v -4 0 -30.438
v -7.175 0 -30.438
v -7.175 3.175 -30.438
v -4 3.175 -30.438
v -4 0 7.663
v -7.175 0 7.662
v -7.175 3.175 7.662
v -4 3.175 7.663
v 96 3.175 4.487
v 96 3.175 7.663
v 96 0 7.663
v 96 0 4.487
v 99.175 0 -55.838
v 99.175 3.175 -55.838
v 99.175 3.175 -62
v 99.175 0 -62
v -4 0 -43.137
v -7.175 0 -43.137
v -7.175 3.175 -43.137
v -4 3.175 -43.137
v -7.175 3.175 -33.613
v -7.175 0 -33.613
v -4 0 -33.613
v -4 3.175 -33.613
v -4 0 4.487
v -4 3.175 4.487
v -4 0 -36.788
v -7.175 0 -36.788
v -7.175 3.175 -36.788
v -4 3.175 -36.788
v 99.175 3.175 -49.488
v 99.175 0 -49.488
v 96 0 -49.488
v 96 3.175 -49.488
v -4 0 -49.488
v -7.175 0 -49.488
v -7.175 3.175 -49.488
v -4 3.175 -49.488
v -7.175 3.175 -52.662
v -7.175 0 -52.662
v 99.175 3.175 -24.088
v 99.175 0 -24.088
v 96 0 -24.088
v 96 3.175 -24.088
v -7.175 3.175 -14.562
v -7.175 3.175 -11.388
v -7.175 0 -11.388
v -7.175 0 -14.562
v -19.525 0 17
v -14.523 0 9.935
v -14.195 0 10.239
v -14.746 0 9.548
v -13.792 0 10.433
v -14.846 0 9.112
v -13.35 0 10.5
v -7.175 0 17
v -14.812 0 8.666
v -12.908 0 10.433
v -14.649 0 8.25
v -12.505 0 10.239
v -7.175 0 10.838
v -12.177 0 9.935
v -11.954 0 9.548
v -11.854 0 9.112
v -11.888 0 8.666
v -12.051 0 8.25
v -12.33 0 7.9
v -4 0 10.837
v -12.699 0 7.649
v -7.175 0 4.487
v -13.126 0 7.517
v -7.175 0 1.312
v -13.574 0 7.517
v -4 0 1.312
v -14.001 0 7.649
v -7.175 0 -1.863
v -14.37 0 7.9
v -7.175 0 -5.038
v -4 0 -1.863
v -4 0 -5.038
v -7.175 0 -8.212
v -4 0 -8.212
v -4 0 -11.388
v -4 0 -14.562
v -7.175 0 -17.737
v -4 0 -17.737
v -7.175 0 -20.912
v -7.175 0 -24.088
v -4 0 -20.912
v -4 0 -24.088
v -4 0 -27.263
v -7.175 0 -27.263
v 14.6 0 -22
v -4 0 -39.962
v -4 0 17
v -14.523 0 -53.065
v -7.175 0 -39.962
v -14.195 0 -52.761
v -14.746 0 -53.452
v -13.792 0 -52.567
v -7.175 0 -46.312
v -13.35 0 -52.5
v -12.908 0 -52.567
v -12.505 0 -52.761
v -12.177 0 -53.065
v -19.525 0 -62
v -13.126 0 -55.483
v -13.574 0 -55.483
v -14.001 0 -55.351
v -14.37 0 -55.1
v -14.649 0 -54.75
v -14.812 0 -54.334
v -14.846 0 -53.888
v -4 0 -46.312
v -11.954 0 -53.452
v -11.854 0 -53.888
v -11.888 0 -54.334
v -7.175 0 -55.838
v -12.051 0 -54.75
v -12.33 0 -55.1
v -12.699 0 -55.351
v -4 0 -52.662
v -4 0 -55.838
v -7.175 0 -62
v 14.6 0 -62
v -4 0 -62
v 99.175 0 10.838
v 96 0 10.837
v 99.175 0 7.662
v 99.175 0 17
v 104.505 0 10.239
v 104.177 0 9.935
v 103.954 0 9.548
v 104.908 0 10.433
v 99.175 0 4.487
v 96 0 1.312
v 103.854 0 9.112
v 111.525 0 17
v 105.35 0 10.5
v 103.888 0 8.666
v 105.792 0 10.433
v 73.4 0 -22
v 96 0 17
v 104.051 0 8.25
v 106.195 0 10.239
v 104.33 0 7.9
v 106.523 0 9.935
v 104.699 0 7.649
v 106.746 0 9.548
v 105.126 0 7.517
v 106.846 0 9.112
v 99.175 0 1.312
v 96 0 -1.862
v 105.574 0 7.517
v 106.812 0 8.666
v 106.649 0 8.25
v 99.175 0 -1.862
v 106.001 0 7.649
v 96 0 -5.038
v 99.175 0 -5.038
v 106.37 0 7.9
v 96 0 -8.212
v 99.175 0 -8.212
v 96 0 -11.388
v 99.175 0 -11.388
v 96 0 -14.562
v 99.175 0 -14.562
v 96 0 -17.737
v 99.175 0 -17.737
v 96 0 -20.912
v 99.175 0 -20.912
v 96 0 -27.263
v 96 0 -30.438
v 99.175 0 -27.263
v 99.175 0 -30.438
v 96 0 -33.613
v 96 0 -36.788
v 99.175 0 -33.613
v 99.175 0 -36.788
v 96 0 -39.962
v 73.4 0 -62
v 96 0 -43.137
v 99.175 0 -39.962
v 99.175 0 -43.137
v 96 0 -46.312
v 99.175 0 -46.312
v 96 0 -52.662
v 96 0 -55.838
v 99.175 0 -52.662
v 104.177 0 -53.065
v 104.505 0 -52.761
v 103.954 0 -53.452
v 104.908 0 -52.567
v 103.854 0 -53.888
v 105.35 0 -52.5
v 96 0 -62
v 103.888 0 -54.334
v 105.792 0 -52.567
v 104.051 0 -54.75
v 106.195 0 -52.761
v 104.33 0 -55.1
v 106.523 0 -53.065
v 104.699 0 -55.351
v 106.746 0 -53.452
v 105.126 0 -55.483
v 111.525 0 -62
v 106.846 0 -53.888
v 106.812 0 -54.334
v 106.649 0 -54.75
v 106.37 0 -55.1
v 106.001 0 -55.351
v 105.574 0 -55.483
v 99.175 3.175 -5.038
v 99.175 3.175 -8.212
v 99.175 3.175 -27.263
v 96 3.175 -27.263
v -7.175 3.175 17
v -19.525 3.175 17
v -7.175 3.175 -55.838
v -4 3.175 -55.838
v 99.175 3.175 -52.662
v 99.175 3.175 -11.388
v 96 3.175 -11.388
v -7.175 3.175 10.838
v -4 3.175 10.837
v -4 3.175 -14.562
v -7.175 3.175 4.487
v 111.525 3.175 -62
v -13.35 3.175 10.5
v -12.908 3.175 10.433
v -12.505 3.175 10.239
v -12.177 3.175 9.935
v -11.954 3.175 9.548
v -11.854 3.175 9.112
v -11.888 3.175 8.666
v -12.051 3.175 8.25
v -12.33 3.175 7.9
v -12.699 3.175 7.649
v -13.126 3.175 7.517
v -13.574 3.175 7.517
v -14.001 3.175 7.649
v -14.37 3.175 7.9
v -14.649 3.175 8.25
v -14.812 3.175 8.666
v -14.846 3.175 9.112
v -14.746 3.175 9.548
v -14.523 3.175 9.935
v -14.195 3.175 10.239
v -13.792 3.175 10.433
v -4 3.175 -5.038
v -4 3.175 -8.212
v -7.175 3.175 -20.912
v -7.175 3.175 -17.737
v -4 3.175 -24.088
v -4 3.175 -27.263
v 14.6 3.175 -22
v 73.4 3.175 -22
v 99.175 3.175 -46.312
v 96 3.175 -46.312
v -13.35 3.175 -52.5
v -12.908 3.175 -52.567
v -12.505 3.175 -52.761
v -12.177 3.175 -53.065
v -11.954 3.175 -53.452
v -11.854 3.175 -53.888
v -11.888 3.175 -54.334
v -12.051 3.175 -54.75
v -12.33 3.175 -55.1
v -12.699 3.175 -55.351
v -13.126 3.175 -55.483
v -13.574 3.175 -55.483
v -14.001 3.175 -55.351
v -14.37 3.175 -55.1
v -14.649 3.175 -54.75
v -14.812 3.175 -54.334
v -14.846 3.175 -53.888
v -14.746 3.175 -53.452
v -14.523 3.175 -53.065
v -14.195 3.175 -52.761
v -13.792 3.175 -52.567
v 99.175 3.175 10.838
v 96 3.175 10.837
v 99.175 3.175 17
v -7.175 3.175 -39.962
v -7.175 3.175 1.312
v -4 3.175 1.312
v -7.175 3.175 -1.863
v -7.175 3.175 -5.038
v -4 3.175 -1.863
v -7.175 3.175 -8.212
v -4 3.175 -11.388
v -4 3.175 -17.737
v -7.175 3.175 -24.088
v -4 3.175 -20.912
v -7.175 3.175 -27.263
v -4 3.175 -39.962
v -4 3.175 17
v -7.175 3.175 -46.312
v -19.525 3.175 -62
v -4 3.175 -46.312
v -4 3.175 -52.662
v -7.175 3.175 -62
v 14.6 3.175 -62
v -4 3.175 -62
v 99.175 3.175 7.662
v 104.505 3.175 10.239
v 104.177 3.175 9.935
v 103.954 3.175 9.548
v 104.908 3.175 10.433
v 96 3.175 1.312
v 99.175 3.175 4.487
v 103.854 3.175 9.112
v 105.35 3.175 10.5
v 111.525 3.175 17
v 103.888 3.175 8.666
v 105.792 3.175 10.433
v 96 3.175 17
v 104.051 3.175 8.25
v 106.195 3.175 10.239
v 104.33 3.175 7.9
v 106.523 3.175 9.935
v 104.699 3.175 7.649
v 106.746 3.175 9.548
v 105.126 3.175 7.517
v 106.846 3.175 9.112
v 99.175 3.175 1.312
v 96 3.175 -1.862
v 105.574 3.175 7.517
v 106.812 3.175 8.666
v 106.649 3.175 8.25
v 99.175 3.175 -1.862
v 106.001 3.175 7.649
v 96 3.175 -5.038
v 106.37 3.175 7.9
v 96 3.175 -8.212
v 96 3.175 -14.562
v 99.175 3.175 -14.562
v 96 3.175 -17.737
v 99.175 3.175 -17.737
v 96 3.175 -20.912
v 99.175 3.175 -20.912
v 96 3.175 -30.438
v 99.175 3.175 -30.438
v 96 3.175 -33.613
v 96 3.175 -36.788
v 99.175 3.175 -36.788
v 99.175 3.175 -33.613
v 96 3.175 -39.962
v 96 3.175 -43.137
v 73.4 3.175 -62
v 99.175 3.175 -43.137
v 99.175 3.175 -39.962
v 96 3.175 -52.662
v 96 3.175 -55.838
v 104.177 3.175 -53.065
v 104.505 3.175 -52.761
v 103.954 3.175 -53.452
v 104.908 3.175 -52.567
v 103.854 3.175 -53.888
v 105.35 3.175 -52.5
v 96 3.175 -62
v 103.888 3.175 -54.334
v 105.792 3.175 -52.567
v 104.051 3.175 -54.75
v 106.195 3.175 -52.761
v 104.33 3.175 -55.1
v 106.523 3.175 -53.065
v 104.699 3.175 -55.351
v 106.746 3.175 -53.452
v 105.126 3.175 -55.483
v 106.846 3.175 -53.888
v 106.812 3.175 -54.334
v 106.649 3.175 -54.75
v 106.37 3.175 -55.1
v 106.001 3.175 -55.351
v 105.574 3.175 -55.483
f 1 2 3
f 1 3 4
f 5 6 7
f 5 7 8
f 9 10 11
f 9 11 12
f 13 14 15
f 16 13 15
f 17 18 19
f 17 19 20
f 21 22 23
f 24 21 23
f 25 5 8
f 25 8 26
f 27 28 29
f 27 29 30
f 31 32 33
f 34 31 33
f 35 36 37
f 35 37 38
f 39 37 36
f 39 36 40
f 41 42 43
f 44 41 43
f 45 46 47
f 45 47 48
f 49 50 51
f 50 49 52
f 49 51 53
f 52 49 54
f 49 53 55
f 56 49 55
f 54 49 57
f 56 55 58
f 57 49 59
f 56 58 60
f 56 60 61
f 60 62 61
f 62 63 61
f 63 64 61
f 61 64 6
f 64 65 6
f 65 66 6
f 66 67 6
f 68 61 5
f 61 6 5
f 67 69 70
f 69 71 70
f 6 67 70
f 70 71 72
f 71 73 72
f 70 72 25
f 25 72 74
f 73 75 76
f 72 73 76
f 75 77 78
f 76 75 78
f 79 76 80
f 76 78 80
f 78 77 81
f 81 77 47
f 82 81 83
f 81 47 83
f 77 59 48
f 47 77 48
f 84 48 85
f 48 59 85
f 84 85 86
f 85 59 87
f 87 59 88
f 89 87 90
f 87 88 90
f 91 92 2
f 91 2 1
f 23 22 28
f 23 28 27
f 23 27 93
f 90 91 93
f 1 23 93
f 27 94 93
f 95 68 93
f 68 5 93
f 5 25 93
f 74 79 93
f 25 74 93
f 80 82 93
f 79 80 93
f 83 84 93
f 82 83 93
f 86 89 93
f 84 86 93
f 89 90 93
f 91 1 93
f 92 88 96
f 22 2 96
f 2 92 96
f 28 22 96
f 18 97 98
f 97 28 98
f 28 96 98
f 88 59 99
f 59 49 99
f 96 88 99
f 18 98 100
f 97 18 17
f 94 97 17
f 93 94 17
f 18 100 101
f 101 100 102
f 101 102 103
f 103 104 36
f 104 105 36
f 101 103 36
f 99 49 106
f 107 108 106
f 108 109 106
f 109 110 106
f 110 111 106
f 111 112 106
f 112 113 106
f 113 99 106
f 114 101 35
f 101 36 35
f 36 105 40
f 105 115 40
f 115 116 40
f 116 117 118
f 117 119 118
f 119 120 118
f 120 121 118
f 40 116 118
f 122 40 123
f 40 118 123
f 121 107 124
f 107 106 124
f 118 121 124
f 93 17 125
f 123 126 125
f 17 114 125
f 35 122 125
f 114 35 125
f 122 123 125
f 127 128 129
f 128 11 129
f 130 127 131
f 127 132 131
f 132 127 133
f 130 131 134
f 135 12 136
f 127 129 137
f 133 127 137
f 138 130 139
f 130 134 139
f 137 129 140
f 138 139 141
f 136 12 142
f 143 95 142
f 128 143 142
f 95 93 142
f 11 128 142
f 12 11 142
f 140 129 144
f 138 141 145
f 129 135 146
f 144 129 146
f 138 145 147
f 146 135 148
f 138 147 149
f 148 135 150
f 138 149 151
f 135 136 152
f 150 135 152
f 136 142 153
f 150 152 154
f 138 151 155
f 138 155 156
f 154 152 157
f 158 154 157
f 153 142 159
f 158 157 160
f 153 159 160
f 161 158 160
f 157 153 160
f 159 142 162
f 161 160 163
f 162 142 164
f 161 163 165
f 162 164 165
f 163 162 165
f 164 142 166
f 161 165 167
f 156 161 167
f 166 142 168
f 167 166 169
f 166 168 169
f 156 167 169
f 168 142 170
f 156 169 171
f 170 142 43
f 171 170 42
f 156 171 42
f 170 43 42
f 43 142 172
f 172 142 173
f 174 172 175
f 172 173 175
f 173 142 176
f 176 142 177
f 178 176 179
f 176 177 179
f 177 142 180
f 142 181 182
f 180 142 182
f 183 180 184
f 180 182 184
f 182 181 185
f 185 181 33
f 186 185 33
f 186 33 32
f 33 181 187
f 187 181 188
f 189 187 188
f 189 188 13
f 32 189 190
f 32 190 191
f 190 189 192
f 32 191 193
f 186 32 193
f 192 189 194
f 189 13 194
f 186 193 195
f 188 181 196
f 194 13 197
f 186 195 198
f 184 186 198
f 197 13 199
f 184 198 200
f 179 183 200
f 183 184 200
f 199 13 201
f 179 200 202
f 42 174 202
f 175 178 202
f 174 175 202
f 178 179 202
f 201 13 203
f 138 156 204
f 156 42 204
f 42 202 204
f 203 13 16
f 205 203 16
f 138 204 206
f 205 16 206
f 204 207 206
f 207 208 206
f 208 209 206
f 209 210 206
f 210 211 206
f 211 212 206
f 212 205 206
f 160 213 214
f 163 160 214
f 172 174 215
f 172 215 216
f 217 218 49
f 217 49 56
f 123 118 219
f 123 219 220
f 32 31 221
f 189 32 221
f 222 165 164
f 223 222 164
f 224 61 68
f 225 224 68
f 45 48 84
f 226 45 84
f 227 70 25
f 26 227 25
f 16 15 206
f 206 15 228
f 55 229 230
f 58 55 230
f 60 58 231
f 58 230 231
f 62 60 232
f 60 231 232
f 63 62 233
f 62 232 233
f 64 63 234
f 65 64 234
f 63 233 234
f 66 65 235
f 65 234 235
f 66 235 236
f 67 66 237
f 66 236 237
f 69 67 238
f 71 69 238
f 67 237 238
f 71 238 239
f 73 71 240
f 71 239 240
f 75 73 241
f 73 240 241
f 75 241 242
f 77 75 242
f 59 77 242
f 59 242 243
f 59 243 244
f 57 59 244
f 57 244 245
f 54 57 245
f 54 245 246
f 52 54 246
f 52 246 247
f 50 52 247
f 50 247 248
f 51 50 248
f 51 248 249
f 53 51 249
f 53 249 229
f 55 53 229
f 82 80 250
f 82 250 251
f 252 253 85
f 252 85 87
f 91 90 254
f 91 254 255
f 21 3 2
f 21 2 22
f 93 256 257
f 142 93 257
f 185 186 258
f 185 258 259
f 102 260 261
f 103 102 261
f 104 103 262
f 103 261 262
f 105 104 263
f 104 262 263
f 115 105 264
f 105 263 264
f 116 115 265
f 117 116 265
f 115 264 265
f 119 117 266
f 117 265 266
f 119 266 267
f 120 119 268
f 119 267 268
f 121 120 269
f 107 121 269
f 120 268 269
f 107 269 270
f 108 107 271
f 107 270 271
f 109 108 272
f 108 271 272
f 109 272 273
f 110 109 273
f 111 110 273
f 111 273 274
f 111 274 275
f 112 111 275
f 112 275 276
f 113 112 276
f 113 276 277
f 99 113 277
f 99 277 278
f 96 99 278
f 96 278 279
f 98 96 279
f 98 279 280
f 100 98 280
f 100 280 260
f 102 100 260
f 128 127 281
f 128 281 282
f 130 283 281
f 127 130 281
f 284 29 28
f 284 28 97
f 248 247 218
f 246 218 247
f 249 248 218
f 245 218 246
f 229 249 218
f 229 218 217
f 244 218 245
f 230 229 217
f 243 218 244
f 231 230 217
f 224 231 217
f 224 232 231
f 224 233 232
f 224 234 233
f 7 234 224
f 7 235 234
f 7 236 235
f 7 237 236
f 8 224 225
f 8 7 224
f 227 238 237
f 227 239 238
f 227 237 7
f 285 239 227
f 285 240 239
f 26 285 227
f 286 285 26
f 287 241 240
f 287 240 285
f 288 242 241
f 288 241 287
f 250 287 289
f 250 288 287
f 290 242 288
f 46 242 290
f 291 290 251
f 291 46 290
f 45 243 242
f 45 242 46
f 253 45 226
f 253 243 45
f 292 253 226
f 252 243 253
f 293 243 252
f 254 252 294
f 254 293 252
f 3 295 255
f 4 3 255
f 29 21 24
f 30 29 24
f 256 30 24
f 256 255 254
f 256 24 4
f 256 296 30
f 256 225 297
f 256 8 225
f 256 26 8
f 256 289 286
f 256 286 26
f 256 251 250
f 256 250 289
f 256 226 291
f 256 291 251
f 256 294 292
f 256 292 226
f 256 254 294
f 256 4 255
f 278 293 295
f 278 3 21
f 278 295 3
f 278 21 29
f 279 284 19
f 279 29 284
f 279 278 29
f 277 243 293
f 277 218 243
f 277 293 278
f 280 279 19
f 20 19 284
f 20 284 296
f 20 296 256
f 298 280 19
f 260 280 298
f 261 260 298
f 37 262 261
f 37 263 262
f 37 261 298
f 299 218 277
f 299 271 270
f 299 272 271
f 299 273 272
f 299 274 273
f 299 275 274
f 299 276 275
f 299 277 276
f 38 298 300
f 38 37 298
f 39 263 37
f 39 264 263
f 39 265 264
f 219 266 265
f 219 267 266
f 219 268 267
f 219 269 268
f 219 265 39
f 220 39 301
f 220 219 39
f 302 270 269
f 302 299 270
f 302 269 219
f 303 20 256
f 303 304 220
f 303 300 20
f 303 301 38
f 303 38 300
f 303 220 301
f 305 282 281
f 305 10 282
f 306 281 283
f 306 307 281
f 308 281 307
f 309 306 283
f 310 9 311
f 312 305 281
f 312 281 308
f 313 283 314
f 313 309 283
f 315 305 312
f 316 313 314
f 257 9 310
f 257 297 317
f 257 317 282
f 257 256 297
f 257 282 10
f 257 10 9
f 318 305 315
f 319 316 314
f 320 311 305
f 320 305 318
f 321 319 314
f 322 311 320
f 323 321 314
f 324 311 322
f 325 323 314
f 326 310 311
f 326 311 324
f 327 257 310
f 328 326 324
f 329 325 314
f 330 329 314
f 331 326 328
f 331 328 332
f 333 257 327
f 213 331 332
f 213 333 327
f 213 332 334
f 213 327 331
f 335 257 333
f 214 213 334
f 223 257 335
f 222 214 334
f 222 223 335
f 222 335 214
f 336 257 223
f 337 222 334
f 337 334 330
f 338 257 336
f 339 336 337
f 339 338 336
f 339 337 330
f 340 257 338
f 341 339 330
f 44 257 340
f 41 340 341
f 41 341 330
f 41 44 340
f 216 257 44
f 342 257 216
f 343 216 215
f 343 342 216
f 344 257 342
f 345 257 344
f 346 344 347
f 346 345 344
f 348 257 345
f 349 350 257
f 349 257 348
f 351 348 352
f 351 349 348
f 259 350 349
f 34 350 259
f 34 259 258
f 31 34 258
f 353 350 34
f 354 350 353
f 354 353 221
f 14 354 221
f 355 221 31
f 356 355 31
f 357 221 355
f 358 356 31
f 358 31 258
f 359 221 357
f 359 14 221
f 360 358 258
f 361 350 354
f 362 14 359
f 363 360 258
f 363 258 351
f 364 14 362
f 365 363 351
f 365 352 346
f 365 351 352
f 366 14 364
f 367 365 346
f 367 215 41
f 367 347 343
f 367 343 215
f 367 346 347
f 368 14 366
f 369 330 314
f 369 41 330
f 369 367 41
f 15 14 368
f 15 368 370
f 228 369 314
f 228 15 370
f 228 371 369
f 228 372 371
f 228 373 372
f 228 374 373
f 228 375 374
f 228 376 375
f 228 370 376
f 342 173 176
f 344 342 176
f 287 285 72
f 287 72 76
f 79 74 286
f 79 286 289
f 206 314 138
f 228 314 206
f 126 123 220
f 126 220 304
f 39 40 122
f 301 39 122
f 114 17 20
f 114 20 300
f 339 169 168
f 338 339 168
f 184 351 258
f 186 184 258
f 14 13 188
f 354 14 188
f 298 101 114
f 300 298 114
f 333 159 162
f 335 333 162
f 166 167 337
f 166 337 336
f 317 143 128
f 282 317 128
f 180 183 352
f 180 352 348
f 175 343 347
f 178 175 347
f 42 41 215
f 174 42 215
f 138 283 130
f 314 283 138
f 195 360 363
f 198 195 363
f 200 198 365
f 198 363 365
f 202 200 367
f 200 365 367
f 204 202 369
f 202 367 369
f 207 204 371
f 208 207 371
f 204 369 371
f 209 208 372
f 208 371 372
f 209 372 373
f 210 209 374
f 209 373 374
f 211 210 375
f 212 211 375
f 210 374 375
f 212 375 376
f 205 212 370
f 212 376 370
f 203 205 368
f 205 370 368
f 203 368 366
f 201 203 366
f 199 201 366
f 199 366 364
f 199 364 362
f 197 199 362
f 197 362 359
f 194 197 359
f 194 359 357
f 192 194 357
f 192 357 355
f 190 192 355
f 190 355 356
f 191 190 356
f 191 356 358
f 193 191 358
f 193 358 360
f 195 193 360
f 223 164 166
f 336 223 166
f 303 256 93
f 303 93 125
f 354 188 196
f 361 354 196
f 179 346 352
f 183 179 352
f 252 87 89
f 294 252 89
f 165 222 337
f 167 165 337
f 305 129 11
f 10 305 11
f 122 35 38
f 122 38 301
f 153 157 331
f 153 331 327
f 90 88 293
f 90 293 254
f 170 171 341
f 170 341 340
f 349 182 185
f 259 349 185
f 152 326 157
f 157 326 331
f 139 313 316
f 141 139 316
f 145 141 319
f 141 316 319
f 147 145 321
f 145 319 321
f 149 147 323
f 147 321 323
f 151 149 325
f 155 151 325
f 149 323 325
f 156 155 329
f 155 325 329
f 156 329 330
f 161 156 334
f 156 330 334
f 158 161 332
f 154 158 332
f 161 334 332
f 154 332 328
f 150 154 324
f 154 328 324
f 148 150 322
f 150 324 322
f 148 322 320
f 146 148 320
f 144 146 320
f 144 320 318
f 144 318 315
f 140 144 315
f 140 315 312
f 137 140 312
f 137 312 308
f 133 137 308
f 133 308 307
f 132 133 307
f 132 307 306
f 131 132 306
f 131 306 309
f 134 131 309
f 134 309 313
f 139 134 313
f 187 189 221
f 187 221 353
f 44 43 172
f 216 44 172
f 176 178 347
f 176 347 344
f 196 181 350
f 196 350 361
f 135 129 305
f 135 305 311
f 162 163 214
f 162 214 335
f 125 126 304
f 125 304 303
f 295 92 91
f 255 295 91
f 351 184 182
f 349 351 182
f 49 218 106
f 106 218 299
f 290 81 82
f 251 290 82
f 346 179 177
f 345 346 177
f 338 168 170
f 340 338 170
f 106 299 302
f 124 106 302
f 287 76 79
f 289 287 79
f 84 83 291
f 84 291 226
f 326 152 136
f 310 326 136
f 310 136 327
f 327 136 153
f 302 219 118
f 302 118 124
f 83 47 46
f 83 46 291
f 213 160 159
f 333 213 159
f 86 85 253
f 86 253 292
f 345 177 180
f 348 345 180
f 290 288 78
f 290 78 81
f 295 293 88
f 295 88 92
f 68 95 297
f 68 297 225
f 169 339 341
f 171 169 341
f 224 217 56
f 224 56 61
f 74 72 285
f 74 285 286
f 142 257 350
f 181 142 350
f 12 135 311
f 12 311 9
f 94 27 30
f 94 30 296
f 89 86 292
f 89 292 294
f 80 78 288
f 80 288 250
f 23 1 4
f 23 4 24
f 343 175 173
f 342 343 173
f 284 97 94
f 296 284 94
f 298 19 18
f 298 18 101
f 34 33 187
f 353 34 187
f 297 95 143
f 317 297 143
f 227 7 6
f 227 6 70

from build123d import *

# Parameters (mm, degrees)
SKETCH3_W                     = 100
SKETCH3_H                     = 79
BOSS_EXTRUDE1_DEPTH           = 3.175
SKETCH5_W                     = 58.8
SKETCH5_H                     = 40
CUT_EXTRUDE2_DEPTH            = 3.175
SKETCH11_W                    = 6.35
SKETCH11_H                    = 3.175
BOSS_EXTRUDE2_DEPTH           = 3.175
LPATTERN2_COUNT               = 6
LPATTERN2_PITCH               = 6.35
LPATTERN2_COPY_1_SKETCH_W     = 6.35
LPATTERN2_COPY_1_SKETCH_H     = 3.175
LPATTERN2_COPY_1_DEPTH        = 3.175
LPATTERN2_COPY_2_SKETCH_W     = 6.35
LPATTERN2_COPY_2_SKETCH_H     = 3.175
LPATTERN2_COPY_2_DEPTH        = 3.175
LPATTERN2_COPY_3_SKETCH_W     = 6.35
LPATTERN2_COPY_3_SKETCH_H     = 3.175
LPATTERN2_COPY_3_DEPTH        = 3.175
LPATTERN2_COPY_4_SKETCH_W     = 6.35
LPATTERN2_COPY_4_SKETCH_H     = 3.175
LPATTERN2_COPY_4_DEPTH        = 3.175
LPATTERN2_COPY_5_SKETCH_W     = 6.35
LPATTERN2_COPY_5_SKETCH_H     = 3.175
LPATTERN2_COPY_5_DEPTH        = 3.175
LPATTERN2_COL_COUNT           = 6
LPATTERN2_COL_PITCH           = 6.35
LPATTERN2_COL_COPY_1_SKETCH_W = 6.35
LPATTERN2_COL_COPY_1_SKETCH_H = 3.175
LPATTERN2_COL_COPY_1_DEPTH    = 3.175
LPATTERN2_COL_COPY_2_SKETCH_W = 6.35
LPATTERN2_COL_COPY_2_SKETCH_H = 3.175
LPATTERN2_COL_COPY_2_DEPTH    = 3.175
LPATTERN2_COL_COPY_3_SKETCH_W = 6.35
LPATTERN2_COL_COPY_3_SKETCH_H = 3.175
LPATTERN2_COL_COPY_3_DEPTH    = 3.175
LPATTERN2_COL_COPY_4_SKETCH_W = 6.35
LPATTERN2_COL_COPY_4_SKETCH_H = 3.175
LPATTERN2_COL_COPY_4_DEPTH    = 3.175
LPATTERN2_COL_COPY_5_SKETCH_W = 6.35
LPATTERN2_COL_COPY_5_SKETCH_H = 3.175
LPATTERN2_COL_COPY_5_DEPTH    = 3.175
SKETCH13_W                    = 12.35
SKETCH13_H                    = 79
BOSS_EXTRUDE4_DEPTH           = 3.175
SKETCH14_W                    = 12.35
SKETCH14_H                    = 79
BOSS_EXTRUDE5_DEPTH           = 3.175
SKETCH15_R                    = 1.5
CUT_EXTRUDE4_DEPTH            = 10
SKETCH16_R                    = 1.5
CUT_EXTRUDE5_DEPTH            = 10


with BuildPart() as part:
    # Sketch3 → Boss-Extrude1 (new body)
    with BuildSketch(Plane(origin=(0, 0, 0), x_dir=(1, 0, 0), z_dir=(0, 1, 0))):
        with Locations((46, 22.5)):
            Rectangle(SKETCH3_W, SKETCH3_H)
    extrude(amount=BOSS_EXTRUDE1_DEPTH)

    # Sketch5 → Cut-Extrude2 (cut)
    with BuildSketch(Plane(origin=(0, 3.175, 0), x_dir=(1, 0, 0), z_dir=(0, 1, 0))):
        with Locations((44, 42)):
            Rectangle(SKETCH5_W, SKETCH5_H)
    extrude(amount=-CUT_EXTRUDE2_DEPTH, mode=Mode.SUBTRACT)

    # Sketch11 → Boss-Extrude2 (add)
    with BuildSketch(Plane(origin=(0, 3.175, 0), x_dir=(1, 0, 0), z_dir=(0, 1, 0))):
        with Locations((-4, 22.5)):
            Rectangle(SKETCH11_W, SKETCH11_H)
    boss_extrude2 = extrude(amount=-BOSS_EXTRUDE2_DEPTH)

    # Mirror2: Boss-Extrude2 across plane
    add(boss_extrude2.mirror(Plane.ZY.offset(-46)))

    # LPattern2: Boss-Extrude2 ×6
    with Locations(*[(0, 0, -i * LPATTERN2_PITCH) for i in range(1, LPATTERN2_COUNT)]):
        add(boss_extrude2)

    # LPattern2 copy 1 sketch → LPattern2 copy 1 (add)
    with BuildSketch(Plane(origin=(92, 3.175, -6.35), x_dir=(-1, 0, 0), z_dir=(0, 1, 0))):
        with Locations((-4, -22.5)):
            Rectangle(LPATTERN2_COPY_1_SKETCH_W, LPATTERN2_COPY_1_SKETCH_H)
    extrude(amount=-LPATTERN2_COPY_1_DEPTH)

    # LPattern2 copy 2 sketch → LPattern2 copy 2 (add)
    with BuildSketch(Plane(origin=(92, 3.175, -12.7), x_dir=(-1, 0, 0), z_dir=(0, 1, 0))):
        with Locations((-4, -22.5)):
            Rectangle(LPATTERN2_COPY_2_SKETCH_W, LPATTERN2_COPY_2_SKETCH_H)
    extrude(amount=-LPATTERN2_COPY_2_DEPTH)

    # LPattern2 copy 3 sketch → LPattern2 copy 3 (add)
    with BuildSketch(Plane(origin=(92, 3.175, -19.05), x_dir=(-1, 0, 0), z_dir=(0, 1, 0))):
        with Locations((-4, -22.5)):
            Rectangle(LPATTERN2_COPY_3_SKETCH_W, LPATTERN2_COPY_3_SKETCH_H)
    extrude(amount=-LPATTERN2_COPY_3_DEPTH)

    # LPattern2 copy 4 sketch → LPattern2 copy 4 (add)
    with BuildSketch(Plane(origin=(92, 3.175, -25.4), x_dir=(-1, 0, 0), z_dir=(0, 1, 0))):
        with Locations((-4, -22.5)):
            Rectangle(LPATTERN2_COPY_4_SKETCH_W, LPATTERN2_COPY_4_SKETCH_H)
    extrude(amount=-LPATTERN2_COPY_4_DEPTH)

    # LPattern2 copy 5 sketch → LPattern2 copy 5 (add)
    with BuildSketch(Plane(origin=(92, 3.175, -31.75), x_dir=(-1, 0, 0), z_dir=(0, 1, 0))):
        with Locations((-4, -22.5)):
            Rectangle(LPATTERN2_COPY_5_SKETCH_W, LPATTERN2_COPY_5_SKETCH_H)
    extrude(amount=-LPATTERN2_COPY_5_DEPTH)

    # LPattern2 col: Boss-Extrude2 ×6
    with Locations(*[(0, 0, i * LPATTERN2_COL_PITCH) for i in range(1, LPATTERN2_COL_COUNT)]):
        add(boss_extrude2)

    # LPattern2 col copy 1 sketch → LPattern2 col copy 1 (add)
    with BuildSketch(Plane(origin=(92, 3.175, 6.35), x_dir=(-1, 0, 0), z_dir=(0, 1, 0))):
        with Locations((-4, -22.5)):
            Rectangle(LPATTERN2_COL_COPY_1_SKETCH_W, LPATTERN2_COL_COPY_1_SKETCH_H)
    extrude(amount=-LPATTERN2_COL_COPY_1_DEPTH)

    # LPattern2 col copy 2 sketch → LPattern2 col copy 2 (add)
    with BuildSketch(Plane(origin=(92, 3.175, 12.7), x_dir=(-1, 0, 0), z_dir=(0, 1, 0))):
        with Locations((-4, -22.5)):
            Rectangle(LPATTERN2_COL_COPY_2_SKETCH_W, LPATTERN2_COL_COPY_2_SKETCH_H)
    extrude(amount=-LPATTERN2_COL_COPY_2_DEPTH)

    # LPattern2 col copy 3 sketch → LPattern2 col copy 3 (add)
    with BuildSketch(Plane(origin=(92, 3.175, 19.05), x_dir=(-1, 0, 0), z_dir=(0, 1, 0))):
        with Locations((-4, -22.5)):
            Rectangle(LPATTERN2_COL_COPY_3_SKETCH_W, LPATTERN2_COL_COPY_3_SKETCH_H)
    extrude(amount=-LPATTERN2_COL_COPY_3_DEPTH)

    # LPattern2 col copy 4 sketch → LPattern2 col copy 4 (add)
    with BuildSketch(Plane(origin=(92, 3.175, 25.4), x_dir=(-1, 0, 0), z_dir=(0, 1, 0))):
        with Locations((-4, -22.5)):
            Rectangle(LPATTERN2_COL_COPY_4_SKETCH_W, LPATTERN2_COL_COPY_4_SKETCH_H)
    extrude(amount=-LPATTERN2_COL_COPY_4_DEPTH)

    # LPattern2 col copy 5 sketch → LPattern2 col copy 5 (add)
    with BuildSketch(Plane(origin=(92, 3.175, 31.75), x_dir=(-1, 0, 0), z_dir=(0, 1, 0))):
        with Locations((-4, -22.5)):
            Rectangle(LPATTERN2_COL_COPY_5_SKETCH_W, LPATTERN2_COL_COPY_5_SKETCH_H)
    extrude(amount=-LPATTERN2_COL_COPY_5_DEPTH)

    # Sketch13 → Boss-Extrude4 (add)
    with BuildSketch(Plane(origin=(0, 3.175, 0), x_dir=(1, 0, 0), z_dir=(0, 1, 0))):
        with Locations((-13.35, 22.5)):
            Rectangle(SKETCH13_W, SKETCH13_H)
    extrude(amount=-BOSS_EXTRUDE4_DEPTH)

    # Sketch14 → Boss-Extrude5 (add)
    with BuildSketch(Plane(origin=(0, 3.175, 0), x_dir=(1, 0, 0), z_dir=(0, 1, 0))):
        with Locations((105.35, 22.5)):
            Rectangle(SKETCH14_W, SKETCH14_H)
    extrude(amount=-BOSS_EXTRUDE5_DEPTH)

    # Sketch15 → Cut-Extrude4 (cut)
    with BuildSketch(Plane(origin=(0, 3.175, 0), x_dir=(1, 0, 0), z_dir=(0, 1, 0))):
        with Locations(Location((-13.35, 54, 0), (0, 0, 270))):
            Circle(SKETCH15_R)
        with Locations(Location((-13.35, -9, 0), (0, 0, 270))):
            Circle(SKETCH15_R)
    extrude(amount=-CUT_EXTRUDE4_DEPTH, mode=Mode.SUBTRACT)

    # Sketch16 → Cut-Extrude5 (cut)
    with BuildSketch(Plane(origin=(0, 3.175, 0), x_dir=(1, 0, 0), z_dir=(0, 1, 0))):
        with Locations(Location((105.35, 54, 0), (0, 0, 270))):
            Circle(SKETCH16_R)
        with Locations(Location((105.35, -9, 0), (0, 0, 270))):
            Circle(SKETCH16_R)
    extrude(amount=-CUT_EXTRUDE5_DEPTH, mode=Mode.SUBTRACT)


solid = part.part
